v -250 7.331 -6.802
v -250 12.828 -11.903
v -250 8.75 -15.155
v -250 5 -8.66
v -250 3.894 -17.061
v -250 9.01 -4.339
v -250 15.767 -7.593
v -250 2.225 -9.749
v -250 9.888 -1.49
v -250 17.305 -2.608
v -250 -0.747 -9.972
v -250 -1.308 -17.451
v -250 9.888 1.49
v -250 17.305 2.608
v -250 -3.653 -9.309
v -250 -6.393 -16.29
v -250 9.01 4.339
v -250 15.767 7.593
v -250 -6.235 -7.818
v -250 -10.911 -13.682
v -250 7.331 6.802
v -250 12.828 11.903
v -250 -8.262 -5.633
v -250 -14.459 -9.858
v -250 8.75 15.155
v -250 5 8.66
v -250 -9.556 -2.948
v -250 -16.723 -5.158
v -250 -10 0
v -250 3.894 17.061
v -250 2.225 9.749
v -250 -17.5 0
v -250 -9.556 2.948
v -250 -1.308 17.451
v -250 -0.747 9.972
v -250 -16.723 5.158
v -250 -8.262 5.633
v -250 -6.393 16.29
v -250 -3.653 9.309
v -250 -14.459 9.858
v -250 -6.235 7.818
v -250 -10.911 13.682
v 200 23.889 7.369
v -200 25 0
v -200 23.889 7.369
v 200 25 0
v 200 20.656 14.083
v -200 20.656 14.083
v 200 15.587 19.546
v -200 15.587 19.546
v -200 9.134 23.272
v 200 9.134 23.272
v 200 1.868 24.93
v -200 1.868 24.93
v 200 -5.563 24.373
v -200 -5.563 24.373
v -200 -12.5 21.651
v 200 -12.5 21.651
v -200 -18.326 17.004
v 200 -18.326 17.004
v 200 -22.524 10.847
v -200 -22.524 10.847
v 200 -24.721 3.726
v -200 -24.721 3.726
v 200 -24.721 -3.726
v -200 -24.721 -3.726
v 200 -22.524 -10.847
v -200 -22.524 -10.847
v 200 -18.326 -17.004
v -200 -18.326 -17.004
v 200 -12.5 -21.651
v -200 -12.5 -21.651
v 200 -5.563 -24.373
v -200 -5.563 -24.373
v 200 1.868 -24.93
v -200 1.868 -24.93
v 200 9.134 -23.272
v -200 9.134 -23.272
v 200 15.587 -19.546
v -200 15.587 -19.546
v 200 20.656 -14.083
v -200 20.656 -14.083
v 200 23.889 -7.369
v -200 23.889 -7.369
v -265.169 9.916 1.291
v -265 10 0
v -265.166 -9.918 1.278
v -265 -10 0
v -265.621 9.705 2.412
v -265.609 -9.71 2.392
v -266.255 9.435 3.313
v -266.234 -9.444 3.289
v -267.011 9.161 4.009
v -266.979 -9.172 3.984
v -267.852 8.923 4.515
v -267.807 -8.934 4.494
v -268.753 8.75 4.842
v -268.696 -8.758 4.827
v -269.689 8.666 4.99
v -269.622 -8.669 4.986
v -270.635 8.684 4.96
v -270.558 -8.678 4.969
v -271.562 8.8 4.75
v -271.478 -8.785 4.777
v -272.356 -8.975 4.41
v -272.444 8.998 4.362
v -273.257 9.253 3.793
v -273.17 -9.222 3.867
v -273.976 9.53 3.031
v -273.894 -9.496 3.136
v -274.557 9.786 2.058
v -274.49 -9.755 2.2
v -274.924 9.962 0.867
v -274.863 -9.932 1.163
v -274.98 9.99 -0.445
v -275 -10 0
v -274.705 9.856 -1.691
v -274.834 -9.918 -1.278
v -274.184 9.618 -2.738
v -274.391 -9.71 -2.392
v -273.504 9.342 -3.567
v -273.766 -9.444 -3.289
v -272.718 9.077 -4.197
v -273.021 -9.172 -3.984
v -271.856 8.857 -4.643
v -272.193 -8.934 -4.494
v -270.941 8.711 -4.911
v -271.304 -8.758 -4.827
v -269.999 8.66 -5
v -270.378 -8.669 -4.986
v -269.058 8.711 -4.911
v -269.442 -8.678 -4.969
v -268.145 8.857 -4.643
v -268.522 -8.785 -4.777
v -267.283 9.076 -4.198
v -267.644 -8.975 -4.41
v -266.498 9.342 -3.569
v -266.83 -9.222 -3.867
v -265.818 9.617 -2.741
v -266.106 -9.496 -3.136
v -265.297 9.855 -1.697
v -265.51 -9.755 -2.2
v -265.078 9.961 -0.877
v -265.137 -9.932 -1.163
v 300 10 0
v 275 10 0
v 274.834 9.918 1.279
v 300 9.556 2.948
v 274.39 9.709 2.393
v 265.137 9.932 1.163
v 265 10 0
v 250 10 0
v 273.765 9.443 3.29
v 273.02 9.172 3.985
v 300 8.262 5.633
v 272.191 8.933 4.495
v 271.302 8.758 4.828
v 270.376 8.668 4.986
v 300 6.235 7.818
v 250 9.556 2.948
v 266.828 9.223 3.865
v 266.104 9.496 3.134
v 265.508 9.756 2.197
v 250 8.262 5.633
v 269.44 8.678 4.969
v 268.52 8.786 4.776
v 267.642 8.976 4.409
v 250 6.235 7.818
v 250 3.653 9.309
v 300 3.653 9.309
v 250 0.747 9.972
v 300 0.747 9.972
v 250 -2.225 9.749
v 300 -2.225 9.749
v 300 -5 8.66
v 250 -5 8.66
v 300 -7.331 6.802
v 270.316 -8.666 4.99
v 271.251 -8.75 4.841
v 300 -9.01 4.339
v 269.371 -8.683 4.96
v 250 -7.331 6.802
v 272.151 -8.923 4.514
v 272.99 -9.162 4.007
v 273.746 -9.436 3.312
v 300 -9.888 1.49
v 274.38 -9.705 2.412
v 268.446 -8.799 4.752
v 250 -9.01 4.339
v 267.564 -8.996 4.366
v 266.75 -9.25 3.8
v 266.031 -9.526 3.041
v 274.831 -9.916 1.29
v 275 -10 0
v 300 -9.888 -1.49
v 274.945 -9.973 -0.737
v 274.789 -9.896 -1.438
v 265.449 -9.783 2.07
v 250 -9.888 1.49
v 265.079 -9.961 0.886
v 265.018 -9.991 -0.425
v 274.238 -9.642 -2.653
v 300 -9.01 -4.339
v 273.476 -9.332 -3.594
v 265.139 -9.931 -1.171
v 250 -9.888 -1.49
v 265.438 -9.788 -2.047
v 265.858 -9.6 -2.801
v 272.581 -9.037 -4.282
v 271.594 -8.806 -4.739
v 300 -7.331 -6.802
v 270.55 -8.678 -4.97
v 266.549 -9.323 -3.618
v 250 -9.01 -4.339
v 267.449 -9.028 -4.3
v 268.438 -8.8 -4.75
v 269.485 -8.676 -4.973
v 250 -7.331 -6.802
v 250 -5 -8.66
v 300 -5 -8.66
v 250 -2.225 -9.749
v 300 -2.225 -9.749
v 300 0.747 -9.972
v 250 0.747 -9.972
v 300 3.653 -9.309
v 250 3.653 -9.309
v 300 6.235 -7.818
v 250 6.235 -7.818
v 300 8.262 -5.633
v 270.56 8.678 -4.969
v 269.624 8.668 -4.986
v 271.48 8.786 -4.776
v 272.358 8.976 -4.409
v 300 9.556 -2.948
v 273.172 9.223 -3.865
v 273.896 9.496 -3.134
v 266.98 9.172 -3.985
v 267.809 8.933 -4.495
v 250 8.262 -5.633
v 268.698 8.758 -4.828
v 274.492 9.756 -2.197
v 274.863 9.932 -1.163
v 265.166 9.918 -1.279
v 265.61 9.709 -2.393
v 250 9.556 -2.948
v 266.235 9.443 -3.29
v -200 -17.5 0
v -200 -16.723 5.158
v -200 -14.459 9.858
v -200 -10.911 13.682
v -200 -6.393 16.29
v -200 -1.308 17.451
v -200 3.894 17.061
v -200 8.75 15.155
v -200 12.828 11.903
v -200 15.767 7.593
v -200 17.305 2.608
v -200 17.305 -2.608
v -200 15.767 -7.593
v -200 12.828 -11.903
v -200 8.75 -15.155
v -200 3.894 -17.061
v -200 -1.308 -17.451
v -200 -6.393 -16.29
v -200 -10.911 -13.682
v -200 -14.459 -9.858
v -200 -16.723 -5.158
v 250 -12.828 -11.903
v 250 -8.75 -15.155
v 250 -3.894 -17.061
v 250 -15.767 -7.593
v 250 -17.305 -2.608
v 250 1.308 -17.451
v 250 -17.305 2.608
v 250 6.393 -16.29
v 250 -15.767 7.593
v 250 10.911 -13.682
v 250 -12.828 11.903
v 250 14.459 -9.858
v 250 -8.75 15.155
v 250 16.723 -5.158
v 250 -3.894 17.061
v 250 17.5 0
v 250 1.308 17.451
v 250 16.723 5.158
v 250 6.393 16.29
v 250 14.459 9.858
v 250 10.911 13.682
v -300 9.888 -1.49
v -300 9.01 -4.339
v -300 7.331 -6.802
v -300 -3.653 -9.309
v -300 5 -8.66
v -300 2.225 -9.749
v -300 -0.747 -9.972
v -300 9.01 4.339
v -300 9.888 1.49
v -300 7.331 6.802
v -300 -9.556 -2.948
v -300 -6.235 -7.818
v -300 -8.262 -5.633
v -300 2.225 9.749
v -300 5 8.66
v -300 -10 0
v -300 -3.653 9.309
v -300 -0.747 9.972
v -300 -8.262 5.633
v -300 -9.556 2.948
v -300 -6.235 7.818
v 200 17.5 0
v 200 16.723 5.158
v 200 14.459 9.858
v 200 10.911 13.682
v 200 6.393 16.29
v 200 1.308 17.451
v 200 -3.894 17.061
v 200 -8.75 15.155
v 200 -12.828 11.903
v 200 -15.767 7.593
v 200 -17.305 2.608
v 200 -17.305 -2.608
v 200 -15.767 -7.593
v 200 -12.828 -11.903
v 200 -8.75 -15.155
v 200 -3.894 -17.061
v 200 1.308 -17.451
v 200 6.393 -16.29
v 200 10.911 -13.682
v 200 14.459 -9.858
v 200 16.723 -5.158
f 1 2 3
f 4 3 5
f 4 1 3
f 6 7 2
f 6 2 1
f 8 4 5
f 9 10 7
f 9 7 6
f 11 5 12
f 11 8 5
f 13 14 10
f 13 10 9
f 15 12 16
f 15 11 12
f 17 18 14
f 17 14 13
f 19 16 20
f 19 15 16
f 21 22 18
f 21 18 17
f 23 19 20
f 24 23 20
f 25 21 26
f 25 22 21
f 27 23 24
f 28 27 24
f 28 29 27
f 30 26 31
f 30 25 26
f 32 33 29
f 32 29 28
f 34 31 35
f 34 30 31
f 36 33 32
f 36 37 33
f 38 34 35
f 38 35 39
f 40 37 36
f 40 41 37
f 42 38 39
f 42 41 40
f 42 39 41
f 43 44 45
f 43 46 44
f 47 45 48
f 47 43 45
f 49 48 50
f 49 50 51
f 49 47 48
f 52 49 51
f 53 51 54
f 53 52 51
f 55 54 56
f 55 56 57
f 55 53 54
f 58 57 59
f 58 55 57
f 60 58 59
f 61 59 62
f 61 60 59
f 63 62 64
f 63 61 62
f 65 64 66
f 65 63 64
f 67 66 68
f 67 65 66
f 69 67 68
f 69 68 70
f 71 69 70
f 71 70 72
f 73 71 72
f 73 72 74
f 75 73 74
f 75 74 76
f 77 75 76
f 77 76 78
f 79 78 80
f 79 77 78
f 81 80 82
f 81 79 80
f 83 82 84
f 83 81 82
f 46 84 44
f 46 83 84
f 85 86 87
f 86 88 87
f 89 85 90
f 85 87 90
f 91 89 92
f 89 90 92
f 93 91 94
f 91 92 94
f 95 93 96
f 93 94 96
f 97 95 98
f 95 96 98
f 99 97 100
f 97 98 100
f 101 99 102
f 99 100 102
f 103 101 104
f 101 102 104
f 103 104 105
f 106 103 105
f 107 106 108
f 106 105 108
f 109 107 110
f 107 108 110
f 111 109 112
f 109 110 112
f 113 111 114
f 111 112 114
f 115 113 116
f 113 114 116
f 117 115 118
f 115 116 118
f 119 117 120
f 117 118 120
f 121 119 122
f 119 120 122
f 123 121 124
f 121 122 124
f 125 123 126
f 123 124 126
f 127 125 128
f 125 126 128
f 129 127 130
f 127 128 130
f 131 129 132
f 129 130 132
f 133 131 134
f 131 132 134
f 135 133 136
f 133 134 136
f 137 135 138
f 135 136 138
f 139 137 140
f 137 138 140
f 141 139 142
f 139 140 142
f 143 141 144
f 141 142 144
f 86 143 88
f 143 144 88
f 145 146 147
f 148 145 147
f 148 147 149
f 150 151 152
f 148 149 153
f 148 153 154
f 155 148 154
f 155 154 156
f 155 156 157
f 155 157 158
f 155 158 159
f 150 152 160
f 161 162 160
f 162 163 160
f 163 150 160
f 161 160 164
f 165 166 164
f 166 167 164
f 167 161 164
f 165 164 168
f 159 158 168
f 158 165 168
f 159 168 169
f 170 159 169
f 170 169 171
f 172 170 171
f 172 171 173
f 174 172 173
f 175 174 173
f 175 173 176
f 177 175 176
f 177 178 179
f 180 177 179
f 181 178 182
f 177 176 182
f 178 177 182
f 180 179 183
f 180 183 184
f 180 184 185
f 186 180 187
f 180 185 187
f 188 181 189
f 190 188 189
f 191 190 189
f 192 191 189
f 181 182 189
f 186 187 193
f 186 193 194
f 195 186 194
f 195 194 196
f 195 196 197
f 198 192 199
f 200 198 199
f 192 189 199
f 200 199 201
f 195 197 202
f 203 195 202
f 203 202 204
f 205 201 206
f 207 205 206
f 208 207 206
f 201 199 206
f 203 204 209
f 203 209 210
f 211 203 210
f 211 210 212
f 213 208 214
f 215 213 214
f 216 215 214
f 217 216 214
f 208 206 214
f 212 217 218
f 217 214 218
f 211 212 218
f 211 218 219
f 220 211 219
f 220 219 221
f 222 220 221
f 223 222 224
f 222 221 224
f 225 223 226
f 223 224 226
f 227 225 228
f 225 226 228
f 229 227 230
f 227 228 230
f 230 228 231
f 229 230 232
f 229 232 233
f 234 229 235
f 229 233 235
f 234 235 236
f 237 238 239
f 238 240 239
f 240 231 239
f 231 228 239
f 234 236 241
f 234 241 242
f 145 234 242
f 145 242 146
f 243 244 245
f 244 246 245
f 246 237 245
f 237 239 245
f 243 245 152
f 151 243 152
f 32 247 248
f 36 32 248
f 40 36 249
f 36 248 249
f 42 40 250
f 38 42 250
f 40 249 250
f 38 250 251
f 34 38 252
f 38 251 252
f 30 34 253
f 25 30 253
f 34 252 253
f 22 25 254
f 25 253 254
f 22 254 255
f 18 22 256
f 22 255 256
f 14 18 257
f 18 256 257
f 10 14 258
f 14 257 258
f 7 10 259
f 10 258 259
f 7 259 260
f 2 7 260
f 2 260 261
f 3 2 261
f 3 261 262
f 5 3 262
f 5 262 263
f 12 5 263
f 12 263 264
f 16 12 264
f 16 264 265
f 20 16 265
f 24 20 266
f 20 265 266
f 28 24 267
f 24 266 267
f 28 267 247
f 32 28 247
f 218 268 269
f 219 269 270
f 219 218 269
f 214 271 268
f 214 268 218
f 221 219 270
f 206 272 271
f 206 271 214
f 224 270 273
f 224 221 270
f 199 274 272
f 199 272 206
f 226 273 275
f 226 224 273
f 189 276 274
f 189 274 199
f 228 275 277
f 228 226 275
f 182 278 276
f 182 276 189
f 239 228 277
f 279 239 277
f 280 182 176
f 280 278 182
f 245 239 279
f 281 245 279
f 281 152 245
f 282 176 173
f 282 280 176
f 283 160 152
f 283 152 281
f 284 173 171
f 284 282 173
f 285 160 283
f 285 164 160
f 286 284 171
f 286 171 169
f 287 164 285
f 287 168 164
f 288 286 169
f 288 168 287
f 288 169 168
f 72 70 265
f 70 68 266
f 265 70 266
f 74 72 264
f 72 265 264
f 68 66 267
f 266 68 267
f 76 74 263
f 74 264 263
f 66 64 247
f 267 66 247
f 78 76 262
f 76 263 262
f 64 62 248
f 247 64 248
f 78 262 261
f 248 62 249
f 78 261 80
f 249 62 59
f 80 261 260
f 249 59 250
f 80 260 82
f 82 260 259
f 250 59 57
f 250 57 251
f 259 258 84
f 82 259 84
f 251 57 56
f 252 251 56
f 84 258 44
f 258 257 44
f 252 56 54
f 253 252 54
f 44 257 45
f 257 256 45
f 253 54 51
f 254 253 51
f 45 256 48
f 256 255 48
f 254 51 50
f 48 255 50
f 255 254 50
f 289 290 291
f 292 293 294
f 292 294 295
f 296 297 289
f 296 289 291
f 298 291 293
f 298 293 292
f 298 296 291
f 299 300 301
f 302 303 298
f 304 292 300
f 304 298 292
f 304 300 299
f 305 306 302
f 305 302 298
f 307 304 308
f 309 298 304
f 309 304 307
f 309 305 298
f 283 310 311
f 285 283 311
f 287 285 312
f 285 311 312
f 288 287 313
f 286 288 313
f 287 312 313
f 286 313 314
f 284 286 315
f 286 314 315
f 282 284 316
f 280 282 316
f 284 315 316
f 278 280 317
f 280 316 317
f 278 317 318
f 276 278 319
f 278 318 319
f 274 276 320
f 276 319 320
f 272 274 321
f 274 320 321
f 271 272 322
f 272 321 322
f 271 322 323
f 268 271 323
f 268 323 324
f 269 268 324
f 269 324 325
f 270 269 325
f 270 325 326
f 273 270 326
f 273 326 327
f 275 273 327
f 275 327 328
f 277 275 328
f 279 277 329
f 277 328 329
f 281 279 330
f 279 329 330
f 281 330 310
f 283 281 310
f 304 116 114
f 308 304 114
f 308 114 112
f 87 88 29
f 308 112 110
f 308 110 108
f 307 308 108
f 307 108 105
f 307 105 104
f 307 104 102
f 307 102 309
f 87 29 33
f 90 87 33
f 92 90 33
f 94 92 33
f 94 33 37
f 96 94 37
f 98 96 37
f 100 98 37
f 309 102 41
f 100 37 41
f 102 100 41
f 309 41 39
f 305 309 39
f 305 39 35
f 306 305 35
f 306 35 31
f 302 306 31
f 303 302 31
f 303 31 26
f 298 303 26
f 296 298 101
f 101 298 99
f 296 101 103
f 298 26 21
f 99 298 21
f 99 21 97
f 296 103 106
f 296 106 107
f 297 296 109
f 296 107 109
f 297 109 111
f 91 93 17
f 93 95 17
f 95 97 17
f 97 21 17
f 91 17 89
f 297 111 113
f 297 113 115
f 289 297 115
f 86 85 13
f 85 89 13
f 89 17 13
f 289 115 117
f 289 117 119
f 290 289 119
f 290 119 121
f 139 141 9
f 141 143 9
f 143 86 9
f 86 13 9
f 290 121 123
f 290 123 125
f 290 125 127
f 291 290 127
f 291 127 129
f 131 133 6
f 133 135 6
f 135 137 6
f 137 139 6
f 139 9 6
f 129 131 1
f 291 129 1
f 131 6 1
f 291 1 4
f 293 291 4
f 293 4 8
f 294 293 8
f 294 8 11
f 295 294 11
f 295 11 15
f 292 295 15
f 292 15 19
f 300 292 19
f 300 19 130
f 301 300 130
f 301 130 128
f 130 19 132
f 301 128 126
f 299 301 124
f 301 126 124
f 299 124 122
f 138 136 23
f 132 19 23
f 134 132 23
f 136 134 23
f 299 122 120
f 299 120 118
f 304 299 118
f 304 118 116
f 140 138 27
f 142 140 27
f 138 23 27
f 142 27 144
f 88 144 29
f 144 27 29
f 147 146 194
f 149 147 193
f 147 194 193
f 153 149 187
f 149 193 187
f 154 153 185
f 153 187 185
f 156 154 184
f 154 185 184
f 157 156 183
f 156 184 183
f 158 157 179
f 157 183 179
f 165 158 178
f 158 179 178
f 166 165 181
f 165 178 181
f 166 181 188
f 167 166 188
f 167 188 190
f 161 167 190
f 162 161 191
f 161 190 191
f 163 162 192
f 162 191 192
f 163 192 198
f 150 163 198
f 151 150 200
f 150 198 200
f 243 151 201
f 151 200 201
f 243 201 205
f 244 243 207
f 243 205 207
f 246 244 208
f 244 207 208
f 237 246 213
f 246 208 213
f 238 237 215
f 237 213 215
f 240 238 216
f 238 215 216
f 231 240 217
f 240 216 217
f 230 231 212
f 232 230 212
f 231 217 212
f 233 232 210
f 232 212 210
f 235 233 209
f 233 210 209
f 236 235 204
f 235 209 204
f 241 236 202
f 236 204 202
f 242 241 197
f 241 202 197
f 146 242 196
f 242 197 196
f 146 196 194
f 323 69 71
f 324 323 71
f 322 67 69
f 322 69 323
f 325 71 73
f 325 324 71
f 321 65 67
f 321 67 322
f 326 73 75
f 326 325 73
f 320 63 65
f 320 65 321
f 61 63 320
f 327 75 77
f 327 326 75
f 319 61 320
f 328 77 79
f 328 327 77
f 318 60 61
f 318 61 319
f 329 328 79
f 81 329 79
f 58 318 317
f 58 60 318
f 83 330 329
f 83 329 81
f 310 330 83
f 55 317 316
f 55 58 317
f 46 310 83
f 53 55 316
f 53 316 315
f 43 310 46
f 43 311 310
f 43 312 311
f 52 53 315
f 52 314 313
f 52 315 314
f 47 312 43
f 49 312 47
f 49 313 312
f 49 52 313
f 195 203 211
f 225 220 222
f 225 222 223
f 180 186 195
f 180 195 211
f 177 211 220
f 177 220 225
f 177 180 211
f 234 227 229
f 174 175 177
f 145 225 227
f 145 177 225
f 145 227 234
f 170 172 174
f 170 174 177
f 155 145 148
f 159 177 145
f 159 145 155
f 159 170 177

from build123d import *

# Parameters (mm, degrees)
F0_R      = 25
F1_DEPTH  = 200
F2_R      = 10
F3_DEPTH  = 100
F4_R      = 10
F5_DEPTH  = 100
F6_R      = 5
F7_DEPTH  = 50
F8_R      = 17.5
F9_DEPTH  = 50
F10_R     = 17.5
F11_DEPTH = 50


with BuildPart() as f1:
    # F0 (on Right) → F1 (new body, symmetric)
    with BuildSketch(Plane.YZ):
        Circle(F0_R)
    extrude(amount=F1_DEPTH, both=True)

    # F2 (on face) → F3 (join)
    with BuildSketch(Plane(origin=(-200, 0, 0), x_dir=(0, -1, 0), z_dir=(-1, 0, 0))):
        Circle(F2_R)
    extrude(amount=F3_DEPTH)

    # F4 (on face) → F5 (join)
    with BuildSketch(Plane.YZ.offset(200)):
        Circle(F4_R)
    extrude(amount=F5_DEPTH)

    # F6 (on Front) → F7 (cut, symmetric)
    with BuildSketch(Plane.XZ):
        with Locations((270, 0)):
            Circle(F6_R)
        with Locations((-270, 0)):
            Circle(F6_R)
    extrude(amount=F7_DEPTH, both=True, mode=Mode.SUBTRACT)

    # F8 (on face) → F9 (join)
    with BuildSketch(Plane(origin=(-200, 0, 0), x_dir=(0, -1, 0), z_dir=(-1, 0, 0))):
        Circle(F8_R)
    extrude(amount=F9_DEPTH)

    # F10 (on face) → F11 (join)
    with BuildSketch(Plane.YZ.offset(200)):
        Circle(F10_R)
    extrude(amount=F11_DEPTH)


solid = f1.part
